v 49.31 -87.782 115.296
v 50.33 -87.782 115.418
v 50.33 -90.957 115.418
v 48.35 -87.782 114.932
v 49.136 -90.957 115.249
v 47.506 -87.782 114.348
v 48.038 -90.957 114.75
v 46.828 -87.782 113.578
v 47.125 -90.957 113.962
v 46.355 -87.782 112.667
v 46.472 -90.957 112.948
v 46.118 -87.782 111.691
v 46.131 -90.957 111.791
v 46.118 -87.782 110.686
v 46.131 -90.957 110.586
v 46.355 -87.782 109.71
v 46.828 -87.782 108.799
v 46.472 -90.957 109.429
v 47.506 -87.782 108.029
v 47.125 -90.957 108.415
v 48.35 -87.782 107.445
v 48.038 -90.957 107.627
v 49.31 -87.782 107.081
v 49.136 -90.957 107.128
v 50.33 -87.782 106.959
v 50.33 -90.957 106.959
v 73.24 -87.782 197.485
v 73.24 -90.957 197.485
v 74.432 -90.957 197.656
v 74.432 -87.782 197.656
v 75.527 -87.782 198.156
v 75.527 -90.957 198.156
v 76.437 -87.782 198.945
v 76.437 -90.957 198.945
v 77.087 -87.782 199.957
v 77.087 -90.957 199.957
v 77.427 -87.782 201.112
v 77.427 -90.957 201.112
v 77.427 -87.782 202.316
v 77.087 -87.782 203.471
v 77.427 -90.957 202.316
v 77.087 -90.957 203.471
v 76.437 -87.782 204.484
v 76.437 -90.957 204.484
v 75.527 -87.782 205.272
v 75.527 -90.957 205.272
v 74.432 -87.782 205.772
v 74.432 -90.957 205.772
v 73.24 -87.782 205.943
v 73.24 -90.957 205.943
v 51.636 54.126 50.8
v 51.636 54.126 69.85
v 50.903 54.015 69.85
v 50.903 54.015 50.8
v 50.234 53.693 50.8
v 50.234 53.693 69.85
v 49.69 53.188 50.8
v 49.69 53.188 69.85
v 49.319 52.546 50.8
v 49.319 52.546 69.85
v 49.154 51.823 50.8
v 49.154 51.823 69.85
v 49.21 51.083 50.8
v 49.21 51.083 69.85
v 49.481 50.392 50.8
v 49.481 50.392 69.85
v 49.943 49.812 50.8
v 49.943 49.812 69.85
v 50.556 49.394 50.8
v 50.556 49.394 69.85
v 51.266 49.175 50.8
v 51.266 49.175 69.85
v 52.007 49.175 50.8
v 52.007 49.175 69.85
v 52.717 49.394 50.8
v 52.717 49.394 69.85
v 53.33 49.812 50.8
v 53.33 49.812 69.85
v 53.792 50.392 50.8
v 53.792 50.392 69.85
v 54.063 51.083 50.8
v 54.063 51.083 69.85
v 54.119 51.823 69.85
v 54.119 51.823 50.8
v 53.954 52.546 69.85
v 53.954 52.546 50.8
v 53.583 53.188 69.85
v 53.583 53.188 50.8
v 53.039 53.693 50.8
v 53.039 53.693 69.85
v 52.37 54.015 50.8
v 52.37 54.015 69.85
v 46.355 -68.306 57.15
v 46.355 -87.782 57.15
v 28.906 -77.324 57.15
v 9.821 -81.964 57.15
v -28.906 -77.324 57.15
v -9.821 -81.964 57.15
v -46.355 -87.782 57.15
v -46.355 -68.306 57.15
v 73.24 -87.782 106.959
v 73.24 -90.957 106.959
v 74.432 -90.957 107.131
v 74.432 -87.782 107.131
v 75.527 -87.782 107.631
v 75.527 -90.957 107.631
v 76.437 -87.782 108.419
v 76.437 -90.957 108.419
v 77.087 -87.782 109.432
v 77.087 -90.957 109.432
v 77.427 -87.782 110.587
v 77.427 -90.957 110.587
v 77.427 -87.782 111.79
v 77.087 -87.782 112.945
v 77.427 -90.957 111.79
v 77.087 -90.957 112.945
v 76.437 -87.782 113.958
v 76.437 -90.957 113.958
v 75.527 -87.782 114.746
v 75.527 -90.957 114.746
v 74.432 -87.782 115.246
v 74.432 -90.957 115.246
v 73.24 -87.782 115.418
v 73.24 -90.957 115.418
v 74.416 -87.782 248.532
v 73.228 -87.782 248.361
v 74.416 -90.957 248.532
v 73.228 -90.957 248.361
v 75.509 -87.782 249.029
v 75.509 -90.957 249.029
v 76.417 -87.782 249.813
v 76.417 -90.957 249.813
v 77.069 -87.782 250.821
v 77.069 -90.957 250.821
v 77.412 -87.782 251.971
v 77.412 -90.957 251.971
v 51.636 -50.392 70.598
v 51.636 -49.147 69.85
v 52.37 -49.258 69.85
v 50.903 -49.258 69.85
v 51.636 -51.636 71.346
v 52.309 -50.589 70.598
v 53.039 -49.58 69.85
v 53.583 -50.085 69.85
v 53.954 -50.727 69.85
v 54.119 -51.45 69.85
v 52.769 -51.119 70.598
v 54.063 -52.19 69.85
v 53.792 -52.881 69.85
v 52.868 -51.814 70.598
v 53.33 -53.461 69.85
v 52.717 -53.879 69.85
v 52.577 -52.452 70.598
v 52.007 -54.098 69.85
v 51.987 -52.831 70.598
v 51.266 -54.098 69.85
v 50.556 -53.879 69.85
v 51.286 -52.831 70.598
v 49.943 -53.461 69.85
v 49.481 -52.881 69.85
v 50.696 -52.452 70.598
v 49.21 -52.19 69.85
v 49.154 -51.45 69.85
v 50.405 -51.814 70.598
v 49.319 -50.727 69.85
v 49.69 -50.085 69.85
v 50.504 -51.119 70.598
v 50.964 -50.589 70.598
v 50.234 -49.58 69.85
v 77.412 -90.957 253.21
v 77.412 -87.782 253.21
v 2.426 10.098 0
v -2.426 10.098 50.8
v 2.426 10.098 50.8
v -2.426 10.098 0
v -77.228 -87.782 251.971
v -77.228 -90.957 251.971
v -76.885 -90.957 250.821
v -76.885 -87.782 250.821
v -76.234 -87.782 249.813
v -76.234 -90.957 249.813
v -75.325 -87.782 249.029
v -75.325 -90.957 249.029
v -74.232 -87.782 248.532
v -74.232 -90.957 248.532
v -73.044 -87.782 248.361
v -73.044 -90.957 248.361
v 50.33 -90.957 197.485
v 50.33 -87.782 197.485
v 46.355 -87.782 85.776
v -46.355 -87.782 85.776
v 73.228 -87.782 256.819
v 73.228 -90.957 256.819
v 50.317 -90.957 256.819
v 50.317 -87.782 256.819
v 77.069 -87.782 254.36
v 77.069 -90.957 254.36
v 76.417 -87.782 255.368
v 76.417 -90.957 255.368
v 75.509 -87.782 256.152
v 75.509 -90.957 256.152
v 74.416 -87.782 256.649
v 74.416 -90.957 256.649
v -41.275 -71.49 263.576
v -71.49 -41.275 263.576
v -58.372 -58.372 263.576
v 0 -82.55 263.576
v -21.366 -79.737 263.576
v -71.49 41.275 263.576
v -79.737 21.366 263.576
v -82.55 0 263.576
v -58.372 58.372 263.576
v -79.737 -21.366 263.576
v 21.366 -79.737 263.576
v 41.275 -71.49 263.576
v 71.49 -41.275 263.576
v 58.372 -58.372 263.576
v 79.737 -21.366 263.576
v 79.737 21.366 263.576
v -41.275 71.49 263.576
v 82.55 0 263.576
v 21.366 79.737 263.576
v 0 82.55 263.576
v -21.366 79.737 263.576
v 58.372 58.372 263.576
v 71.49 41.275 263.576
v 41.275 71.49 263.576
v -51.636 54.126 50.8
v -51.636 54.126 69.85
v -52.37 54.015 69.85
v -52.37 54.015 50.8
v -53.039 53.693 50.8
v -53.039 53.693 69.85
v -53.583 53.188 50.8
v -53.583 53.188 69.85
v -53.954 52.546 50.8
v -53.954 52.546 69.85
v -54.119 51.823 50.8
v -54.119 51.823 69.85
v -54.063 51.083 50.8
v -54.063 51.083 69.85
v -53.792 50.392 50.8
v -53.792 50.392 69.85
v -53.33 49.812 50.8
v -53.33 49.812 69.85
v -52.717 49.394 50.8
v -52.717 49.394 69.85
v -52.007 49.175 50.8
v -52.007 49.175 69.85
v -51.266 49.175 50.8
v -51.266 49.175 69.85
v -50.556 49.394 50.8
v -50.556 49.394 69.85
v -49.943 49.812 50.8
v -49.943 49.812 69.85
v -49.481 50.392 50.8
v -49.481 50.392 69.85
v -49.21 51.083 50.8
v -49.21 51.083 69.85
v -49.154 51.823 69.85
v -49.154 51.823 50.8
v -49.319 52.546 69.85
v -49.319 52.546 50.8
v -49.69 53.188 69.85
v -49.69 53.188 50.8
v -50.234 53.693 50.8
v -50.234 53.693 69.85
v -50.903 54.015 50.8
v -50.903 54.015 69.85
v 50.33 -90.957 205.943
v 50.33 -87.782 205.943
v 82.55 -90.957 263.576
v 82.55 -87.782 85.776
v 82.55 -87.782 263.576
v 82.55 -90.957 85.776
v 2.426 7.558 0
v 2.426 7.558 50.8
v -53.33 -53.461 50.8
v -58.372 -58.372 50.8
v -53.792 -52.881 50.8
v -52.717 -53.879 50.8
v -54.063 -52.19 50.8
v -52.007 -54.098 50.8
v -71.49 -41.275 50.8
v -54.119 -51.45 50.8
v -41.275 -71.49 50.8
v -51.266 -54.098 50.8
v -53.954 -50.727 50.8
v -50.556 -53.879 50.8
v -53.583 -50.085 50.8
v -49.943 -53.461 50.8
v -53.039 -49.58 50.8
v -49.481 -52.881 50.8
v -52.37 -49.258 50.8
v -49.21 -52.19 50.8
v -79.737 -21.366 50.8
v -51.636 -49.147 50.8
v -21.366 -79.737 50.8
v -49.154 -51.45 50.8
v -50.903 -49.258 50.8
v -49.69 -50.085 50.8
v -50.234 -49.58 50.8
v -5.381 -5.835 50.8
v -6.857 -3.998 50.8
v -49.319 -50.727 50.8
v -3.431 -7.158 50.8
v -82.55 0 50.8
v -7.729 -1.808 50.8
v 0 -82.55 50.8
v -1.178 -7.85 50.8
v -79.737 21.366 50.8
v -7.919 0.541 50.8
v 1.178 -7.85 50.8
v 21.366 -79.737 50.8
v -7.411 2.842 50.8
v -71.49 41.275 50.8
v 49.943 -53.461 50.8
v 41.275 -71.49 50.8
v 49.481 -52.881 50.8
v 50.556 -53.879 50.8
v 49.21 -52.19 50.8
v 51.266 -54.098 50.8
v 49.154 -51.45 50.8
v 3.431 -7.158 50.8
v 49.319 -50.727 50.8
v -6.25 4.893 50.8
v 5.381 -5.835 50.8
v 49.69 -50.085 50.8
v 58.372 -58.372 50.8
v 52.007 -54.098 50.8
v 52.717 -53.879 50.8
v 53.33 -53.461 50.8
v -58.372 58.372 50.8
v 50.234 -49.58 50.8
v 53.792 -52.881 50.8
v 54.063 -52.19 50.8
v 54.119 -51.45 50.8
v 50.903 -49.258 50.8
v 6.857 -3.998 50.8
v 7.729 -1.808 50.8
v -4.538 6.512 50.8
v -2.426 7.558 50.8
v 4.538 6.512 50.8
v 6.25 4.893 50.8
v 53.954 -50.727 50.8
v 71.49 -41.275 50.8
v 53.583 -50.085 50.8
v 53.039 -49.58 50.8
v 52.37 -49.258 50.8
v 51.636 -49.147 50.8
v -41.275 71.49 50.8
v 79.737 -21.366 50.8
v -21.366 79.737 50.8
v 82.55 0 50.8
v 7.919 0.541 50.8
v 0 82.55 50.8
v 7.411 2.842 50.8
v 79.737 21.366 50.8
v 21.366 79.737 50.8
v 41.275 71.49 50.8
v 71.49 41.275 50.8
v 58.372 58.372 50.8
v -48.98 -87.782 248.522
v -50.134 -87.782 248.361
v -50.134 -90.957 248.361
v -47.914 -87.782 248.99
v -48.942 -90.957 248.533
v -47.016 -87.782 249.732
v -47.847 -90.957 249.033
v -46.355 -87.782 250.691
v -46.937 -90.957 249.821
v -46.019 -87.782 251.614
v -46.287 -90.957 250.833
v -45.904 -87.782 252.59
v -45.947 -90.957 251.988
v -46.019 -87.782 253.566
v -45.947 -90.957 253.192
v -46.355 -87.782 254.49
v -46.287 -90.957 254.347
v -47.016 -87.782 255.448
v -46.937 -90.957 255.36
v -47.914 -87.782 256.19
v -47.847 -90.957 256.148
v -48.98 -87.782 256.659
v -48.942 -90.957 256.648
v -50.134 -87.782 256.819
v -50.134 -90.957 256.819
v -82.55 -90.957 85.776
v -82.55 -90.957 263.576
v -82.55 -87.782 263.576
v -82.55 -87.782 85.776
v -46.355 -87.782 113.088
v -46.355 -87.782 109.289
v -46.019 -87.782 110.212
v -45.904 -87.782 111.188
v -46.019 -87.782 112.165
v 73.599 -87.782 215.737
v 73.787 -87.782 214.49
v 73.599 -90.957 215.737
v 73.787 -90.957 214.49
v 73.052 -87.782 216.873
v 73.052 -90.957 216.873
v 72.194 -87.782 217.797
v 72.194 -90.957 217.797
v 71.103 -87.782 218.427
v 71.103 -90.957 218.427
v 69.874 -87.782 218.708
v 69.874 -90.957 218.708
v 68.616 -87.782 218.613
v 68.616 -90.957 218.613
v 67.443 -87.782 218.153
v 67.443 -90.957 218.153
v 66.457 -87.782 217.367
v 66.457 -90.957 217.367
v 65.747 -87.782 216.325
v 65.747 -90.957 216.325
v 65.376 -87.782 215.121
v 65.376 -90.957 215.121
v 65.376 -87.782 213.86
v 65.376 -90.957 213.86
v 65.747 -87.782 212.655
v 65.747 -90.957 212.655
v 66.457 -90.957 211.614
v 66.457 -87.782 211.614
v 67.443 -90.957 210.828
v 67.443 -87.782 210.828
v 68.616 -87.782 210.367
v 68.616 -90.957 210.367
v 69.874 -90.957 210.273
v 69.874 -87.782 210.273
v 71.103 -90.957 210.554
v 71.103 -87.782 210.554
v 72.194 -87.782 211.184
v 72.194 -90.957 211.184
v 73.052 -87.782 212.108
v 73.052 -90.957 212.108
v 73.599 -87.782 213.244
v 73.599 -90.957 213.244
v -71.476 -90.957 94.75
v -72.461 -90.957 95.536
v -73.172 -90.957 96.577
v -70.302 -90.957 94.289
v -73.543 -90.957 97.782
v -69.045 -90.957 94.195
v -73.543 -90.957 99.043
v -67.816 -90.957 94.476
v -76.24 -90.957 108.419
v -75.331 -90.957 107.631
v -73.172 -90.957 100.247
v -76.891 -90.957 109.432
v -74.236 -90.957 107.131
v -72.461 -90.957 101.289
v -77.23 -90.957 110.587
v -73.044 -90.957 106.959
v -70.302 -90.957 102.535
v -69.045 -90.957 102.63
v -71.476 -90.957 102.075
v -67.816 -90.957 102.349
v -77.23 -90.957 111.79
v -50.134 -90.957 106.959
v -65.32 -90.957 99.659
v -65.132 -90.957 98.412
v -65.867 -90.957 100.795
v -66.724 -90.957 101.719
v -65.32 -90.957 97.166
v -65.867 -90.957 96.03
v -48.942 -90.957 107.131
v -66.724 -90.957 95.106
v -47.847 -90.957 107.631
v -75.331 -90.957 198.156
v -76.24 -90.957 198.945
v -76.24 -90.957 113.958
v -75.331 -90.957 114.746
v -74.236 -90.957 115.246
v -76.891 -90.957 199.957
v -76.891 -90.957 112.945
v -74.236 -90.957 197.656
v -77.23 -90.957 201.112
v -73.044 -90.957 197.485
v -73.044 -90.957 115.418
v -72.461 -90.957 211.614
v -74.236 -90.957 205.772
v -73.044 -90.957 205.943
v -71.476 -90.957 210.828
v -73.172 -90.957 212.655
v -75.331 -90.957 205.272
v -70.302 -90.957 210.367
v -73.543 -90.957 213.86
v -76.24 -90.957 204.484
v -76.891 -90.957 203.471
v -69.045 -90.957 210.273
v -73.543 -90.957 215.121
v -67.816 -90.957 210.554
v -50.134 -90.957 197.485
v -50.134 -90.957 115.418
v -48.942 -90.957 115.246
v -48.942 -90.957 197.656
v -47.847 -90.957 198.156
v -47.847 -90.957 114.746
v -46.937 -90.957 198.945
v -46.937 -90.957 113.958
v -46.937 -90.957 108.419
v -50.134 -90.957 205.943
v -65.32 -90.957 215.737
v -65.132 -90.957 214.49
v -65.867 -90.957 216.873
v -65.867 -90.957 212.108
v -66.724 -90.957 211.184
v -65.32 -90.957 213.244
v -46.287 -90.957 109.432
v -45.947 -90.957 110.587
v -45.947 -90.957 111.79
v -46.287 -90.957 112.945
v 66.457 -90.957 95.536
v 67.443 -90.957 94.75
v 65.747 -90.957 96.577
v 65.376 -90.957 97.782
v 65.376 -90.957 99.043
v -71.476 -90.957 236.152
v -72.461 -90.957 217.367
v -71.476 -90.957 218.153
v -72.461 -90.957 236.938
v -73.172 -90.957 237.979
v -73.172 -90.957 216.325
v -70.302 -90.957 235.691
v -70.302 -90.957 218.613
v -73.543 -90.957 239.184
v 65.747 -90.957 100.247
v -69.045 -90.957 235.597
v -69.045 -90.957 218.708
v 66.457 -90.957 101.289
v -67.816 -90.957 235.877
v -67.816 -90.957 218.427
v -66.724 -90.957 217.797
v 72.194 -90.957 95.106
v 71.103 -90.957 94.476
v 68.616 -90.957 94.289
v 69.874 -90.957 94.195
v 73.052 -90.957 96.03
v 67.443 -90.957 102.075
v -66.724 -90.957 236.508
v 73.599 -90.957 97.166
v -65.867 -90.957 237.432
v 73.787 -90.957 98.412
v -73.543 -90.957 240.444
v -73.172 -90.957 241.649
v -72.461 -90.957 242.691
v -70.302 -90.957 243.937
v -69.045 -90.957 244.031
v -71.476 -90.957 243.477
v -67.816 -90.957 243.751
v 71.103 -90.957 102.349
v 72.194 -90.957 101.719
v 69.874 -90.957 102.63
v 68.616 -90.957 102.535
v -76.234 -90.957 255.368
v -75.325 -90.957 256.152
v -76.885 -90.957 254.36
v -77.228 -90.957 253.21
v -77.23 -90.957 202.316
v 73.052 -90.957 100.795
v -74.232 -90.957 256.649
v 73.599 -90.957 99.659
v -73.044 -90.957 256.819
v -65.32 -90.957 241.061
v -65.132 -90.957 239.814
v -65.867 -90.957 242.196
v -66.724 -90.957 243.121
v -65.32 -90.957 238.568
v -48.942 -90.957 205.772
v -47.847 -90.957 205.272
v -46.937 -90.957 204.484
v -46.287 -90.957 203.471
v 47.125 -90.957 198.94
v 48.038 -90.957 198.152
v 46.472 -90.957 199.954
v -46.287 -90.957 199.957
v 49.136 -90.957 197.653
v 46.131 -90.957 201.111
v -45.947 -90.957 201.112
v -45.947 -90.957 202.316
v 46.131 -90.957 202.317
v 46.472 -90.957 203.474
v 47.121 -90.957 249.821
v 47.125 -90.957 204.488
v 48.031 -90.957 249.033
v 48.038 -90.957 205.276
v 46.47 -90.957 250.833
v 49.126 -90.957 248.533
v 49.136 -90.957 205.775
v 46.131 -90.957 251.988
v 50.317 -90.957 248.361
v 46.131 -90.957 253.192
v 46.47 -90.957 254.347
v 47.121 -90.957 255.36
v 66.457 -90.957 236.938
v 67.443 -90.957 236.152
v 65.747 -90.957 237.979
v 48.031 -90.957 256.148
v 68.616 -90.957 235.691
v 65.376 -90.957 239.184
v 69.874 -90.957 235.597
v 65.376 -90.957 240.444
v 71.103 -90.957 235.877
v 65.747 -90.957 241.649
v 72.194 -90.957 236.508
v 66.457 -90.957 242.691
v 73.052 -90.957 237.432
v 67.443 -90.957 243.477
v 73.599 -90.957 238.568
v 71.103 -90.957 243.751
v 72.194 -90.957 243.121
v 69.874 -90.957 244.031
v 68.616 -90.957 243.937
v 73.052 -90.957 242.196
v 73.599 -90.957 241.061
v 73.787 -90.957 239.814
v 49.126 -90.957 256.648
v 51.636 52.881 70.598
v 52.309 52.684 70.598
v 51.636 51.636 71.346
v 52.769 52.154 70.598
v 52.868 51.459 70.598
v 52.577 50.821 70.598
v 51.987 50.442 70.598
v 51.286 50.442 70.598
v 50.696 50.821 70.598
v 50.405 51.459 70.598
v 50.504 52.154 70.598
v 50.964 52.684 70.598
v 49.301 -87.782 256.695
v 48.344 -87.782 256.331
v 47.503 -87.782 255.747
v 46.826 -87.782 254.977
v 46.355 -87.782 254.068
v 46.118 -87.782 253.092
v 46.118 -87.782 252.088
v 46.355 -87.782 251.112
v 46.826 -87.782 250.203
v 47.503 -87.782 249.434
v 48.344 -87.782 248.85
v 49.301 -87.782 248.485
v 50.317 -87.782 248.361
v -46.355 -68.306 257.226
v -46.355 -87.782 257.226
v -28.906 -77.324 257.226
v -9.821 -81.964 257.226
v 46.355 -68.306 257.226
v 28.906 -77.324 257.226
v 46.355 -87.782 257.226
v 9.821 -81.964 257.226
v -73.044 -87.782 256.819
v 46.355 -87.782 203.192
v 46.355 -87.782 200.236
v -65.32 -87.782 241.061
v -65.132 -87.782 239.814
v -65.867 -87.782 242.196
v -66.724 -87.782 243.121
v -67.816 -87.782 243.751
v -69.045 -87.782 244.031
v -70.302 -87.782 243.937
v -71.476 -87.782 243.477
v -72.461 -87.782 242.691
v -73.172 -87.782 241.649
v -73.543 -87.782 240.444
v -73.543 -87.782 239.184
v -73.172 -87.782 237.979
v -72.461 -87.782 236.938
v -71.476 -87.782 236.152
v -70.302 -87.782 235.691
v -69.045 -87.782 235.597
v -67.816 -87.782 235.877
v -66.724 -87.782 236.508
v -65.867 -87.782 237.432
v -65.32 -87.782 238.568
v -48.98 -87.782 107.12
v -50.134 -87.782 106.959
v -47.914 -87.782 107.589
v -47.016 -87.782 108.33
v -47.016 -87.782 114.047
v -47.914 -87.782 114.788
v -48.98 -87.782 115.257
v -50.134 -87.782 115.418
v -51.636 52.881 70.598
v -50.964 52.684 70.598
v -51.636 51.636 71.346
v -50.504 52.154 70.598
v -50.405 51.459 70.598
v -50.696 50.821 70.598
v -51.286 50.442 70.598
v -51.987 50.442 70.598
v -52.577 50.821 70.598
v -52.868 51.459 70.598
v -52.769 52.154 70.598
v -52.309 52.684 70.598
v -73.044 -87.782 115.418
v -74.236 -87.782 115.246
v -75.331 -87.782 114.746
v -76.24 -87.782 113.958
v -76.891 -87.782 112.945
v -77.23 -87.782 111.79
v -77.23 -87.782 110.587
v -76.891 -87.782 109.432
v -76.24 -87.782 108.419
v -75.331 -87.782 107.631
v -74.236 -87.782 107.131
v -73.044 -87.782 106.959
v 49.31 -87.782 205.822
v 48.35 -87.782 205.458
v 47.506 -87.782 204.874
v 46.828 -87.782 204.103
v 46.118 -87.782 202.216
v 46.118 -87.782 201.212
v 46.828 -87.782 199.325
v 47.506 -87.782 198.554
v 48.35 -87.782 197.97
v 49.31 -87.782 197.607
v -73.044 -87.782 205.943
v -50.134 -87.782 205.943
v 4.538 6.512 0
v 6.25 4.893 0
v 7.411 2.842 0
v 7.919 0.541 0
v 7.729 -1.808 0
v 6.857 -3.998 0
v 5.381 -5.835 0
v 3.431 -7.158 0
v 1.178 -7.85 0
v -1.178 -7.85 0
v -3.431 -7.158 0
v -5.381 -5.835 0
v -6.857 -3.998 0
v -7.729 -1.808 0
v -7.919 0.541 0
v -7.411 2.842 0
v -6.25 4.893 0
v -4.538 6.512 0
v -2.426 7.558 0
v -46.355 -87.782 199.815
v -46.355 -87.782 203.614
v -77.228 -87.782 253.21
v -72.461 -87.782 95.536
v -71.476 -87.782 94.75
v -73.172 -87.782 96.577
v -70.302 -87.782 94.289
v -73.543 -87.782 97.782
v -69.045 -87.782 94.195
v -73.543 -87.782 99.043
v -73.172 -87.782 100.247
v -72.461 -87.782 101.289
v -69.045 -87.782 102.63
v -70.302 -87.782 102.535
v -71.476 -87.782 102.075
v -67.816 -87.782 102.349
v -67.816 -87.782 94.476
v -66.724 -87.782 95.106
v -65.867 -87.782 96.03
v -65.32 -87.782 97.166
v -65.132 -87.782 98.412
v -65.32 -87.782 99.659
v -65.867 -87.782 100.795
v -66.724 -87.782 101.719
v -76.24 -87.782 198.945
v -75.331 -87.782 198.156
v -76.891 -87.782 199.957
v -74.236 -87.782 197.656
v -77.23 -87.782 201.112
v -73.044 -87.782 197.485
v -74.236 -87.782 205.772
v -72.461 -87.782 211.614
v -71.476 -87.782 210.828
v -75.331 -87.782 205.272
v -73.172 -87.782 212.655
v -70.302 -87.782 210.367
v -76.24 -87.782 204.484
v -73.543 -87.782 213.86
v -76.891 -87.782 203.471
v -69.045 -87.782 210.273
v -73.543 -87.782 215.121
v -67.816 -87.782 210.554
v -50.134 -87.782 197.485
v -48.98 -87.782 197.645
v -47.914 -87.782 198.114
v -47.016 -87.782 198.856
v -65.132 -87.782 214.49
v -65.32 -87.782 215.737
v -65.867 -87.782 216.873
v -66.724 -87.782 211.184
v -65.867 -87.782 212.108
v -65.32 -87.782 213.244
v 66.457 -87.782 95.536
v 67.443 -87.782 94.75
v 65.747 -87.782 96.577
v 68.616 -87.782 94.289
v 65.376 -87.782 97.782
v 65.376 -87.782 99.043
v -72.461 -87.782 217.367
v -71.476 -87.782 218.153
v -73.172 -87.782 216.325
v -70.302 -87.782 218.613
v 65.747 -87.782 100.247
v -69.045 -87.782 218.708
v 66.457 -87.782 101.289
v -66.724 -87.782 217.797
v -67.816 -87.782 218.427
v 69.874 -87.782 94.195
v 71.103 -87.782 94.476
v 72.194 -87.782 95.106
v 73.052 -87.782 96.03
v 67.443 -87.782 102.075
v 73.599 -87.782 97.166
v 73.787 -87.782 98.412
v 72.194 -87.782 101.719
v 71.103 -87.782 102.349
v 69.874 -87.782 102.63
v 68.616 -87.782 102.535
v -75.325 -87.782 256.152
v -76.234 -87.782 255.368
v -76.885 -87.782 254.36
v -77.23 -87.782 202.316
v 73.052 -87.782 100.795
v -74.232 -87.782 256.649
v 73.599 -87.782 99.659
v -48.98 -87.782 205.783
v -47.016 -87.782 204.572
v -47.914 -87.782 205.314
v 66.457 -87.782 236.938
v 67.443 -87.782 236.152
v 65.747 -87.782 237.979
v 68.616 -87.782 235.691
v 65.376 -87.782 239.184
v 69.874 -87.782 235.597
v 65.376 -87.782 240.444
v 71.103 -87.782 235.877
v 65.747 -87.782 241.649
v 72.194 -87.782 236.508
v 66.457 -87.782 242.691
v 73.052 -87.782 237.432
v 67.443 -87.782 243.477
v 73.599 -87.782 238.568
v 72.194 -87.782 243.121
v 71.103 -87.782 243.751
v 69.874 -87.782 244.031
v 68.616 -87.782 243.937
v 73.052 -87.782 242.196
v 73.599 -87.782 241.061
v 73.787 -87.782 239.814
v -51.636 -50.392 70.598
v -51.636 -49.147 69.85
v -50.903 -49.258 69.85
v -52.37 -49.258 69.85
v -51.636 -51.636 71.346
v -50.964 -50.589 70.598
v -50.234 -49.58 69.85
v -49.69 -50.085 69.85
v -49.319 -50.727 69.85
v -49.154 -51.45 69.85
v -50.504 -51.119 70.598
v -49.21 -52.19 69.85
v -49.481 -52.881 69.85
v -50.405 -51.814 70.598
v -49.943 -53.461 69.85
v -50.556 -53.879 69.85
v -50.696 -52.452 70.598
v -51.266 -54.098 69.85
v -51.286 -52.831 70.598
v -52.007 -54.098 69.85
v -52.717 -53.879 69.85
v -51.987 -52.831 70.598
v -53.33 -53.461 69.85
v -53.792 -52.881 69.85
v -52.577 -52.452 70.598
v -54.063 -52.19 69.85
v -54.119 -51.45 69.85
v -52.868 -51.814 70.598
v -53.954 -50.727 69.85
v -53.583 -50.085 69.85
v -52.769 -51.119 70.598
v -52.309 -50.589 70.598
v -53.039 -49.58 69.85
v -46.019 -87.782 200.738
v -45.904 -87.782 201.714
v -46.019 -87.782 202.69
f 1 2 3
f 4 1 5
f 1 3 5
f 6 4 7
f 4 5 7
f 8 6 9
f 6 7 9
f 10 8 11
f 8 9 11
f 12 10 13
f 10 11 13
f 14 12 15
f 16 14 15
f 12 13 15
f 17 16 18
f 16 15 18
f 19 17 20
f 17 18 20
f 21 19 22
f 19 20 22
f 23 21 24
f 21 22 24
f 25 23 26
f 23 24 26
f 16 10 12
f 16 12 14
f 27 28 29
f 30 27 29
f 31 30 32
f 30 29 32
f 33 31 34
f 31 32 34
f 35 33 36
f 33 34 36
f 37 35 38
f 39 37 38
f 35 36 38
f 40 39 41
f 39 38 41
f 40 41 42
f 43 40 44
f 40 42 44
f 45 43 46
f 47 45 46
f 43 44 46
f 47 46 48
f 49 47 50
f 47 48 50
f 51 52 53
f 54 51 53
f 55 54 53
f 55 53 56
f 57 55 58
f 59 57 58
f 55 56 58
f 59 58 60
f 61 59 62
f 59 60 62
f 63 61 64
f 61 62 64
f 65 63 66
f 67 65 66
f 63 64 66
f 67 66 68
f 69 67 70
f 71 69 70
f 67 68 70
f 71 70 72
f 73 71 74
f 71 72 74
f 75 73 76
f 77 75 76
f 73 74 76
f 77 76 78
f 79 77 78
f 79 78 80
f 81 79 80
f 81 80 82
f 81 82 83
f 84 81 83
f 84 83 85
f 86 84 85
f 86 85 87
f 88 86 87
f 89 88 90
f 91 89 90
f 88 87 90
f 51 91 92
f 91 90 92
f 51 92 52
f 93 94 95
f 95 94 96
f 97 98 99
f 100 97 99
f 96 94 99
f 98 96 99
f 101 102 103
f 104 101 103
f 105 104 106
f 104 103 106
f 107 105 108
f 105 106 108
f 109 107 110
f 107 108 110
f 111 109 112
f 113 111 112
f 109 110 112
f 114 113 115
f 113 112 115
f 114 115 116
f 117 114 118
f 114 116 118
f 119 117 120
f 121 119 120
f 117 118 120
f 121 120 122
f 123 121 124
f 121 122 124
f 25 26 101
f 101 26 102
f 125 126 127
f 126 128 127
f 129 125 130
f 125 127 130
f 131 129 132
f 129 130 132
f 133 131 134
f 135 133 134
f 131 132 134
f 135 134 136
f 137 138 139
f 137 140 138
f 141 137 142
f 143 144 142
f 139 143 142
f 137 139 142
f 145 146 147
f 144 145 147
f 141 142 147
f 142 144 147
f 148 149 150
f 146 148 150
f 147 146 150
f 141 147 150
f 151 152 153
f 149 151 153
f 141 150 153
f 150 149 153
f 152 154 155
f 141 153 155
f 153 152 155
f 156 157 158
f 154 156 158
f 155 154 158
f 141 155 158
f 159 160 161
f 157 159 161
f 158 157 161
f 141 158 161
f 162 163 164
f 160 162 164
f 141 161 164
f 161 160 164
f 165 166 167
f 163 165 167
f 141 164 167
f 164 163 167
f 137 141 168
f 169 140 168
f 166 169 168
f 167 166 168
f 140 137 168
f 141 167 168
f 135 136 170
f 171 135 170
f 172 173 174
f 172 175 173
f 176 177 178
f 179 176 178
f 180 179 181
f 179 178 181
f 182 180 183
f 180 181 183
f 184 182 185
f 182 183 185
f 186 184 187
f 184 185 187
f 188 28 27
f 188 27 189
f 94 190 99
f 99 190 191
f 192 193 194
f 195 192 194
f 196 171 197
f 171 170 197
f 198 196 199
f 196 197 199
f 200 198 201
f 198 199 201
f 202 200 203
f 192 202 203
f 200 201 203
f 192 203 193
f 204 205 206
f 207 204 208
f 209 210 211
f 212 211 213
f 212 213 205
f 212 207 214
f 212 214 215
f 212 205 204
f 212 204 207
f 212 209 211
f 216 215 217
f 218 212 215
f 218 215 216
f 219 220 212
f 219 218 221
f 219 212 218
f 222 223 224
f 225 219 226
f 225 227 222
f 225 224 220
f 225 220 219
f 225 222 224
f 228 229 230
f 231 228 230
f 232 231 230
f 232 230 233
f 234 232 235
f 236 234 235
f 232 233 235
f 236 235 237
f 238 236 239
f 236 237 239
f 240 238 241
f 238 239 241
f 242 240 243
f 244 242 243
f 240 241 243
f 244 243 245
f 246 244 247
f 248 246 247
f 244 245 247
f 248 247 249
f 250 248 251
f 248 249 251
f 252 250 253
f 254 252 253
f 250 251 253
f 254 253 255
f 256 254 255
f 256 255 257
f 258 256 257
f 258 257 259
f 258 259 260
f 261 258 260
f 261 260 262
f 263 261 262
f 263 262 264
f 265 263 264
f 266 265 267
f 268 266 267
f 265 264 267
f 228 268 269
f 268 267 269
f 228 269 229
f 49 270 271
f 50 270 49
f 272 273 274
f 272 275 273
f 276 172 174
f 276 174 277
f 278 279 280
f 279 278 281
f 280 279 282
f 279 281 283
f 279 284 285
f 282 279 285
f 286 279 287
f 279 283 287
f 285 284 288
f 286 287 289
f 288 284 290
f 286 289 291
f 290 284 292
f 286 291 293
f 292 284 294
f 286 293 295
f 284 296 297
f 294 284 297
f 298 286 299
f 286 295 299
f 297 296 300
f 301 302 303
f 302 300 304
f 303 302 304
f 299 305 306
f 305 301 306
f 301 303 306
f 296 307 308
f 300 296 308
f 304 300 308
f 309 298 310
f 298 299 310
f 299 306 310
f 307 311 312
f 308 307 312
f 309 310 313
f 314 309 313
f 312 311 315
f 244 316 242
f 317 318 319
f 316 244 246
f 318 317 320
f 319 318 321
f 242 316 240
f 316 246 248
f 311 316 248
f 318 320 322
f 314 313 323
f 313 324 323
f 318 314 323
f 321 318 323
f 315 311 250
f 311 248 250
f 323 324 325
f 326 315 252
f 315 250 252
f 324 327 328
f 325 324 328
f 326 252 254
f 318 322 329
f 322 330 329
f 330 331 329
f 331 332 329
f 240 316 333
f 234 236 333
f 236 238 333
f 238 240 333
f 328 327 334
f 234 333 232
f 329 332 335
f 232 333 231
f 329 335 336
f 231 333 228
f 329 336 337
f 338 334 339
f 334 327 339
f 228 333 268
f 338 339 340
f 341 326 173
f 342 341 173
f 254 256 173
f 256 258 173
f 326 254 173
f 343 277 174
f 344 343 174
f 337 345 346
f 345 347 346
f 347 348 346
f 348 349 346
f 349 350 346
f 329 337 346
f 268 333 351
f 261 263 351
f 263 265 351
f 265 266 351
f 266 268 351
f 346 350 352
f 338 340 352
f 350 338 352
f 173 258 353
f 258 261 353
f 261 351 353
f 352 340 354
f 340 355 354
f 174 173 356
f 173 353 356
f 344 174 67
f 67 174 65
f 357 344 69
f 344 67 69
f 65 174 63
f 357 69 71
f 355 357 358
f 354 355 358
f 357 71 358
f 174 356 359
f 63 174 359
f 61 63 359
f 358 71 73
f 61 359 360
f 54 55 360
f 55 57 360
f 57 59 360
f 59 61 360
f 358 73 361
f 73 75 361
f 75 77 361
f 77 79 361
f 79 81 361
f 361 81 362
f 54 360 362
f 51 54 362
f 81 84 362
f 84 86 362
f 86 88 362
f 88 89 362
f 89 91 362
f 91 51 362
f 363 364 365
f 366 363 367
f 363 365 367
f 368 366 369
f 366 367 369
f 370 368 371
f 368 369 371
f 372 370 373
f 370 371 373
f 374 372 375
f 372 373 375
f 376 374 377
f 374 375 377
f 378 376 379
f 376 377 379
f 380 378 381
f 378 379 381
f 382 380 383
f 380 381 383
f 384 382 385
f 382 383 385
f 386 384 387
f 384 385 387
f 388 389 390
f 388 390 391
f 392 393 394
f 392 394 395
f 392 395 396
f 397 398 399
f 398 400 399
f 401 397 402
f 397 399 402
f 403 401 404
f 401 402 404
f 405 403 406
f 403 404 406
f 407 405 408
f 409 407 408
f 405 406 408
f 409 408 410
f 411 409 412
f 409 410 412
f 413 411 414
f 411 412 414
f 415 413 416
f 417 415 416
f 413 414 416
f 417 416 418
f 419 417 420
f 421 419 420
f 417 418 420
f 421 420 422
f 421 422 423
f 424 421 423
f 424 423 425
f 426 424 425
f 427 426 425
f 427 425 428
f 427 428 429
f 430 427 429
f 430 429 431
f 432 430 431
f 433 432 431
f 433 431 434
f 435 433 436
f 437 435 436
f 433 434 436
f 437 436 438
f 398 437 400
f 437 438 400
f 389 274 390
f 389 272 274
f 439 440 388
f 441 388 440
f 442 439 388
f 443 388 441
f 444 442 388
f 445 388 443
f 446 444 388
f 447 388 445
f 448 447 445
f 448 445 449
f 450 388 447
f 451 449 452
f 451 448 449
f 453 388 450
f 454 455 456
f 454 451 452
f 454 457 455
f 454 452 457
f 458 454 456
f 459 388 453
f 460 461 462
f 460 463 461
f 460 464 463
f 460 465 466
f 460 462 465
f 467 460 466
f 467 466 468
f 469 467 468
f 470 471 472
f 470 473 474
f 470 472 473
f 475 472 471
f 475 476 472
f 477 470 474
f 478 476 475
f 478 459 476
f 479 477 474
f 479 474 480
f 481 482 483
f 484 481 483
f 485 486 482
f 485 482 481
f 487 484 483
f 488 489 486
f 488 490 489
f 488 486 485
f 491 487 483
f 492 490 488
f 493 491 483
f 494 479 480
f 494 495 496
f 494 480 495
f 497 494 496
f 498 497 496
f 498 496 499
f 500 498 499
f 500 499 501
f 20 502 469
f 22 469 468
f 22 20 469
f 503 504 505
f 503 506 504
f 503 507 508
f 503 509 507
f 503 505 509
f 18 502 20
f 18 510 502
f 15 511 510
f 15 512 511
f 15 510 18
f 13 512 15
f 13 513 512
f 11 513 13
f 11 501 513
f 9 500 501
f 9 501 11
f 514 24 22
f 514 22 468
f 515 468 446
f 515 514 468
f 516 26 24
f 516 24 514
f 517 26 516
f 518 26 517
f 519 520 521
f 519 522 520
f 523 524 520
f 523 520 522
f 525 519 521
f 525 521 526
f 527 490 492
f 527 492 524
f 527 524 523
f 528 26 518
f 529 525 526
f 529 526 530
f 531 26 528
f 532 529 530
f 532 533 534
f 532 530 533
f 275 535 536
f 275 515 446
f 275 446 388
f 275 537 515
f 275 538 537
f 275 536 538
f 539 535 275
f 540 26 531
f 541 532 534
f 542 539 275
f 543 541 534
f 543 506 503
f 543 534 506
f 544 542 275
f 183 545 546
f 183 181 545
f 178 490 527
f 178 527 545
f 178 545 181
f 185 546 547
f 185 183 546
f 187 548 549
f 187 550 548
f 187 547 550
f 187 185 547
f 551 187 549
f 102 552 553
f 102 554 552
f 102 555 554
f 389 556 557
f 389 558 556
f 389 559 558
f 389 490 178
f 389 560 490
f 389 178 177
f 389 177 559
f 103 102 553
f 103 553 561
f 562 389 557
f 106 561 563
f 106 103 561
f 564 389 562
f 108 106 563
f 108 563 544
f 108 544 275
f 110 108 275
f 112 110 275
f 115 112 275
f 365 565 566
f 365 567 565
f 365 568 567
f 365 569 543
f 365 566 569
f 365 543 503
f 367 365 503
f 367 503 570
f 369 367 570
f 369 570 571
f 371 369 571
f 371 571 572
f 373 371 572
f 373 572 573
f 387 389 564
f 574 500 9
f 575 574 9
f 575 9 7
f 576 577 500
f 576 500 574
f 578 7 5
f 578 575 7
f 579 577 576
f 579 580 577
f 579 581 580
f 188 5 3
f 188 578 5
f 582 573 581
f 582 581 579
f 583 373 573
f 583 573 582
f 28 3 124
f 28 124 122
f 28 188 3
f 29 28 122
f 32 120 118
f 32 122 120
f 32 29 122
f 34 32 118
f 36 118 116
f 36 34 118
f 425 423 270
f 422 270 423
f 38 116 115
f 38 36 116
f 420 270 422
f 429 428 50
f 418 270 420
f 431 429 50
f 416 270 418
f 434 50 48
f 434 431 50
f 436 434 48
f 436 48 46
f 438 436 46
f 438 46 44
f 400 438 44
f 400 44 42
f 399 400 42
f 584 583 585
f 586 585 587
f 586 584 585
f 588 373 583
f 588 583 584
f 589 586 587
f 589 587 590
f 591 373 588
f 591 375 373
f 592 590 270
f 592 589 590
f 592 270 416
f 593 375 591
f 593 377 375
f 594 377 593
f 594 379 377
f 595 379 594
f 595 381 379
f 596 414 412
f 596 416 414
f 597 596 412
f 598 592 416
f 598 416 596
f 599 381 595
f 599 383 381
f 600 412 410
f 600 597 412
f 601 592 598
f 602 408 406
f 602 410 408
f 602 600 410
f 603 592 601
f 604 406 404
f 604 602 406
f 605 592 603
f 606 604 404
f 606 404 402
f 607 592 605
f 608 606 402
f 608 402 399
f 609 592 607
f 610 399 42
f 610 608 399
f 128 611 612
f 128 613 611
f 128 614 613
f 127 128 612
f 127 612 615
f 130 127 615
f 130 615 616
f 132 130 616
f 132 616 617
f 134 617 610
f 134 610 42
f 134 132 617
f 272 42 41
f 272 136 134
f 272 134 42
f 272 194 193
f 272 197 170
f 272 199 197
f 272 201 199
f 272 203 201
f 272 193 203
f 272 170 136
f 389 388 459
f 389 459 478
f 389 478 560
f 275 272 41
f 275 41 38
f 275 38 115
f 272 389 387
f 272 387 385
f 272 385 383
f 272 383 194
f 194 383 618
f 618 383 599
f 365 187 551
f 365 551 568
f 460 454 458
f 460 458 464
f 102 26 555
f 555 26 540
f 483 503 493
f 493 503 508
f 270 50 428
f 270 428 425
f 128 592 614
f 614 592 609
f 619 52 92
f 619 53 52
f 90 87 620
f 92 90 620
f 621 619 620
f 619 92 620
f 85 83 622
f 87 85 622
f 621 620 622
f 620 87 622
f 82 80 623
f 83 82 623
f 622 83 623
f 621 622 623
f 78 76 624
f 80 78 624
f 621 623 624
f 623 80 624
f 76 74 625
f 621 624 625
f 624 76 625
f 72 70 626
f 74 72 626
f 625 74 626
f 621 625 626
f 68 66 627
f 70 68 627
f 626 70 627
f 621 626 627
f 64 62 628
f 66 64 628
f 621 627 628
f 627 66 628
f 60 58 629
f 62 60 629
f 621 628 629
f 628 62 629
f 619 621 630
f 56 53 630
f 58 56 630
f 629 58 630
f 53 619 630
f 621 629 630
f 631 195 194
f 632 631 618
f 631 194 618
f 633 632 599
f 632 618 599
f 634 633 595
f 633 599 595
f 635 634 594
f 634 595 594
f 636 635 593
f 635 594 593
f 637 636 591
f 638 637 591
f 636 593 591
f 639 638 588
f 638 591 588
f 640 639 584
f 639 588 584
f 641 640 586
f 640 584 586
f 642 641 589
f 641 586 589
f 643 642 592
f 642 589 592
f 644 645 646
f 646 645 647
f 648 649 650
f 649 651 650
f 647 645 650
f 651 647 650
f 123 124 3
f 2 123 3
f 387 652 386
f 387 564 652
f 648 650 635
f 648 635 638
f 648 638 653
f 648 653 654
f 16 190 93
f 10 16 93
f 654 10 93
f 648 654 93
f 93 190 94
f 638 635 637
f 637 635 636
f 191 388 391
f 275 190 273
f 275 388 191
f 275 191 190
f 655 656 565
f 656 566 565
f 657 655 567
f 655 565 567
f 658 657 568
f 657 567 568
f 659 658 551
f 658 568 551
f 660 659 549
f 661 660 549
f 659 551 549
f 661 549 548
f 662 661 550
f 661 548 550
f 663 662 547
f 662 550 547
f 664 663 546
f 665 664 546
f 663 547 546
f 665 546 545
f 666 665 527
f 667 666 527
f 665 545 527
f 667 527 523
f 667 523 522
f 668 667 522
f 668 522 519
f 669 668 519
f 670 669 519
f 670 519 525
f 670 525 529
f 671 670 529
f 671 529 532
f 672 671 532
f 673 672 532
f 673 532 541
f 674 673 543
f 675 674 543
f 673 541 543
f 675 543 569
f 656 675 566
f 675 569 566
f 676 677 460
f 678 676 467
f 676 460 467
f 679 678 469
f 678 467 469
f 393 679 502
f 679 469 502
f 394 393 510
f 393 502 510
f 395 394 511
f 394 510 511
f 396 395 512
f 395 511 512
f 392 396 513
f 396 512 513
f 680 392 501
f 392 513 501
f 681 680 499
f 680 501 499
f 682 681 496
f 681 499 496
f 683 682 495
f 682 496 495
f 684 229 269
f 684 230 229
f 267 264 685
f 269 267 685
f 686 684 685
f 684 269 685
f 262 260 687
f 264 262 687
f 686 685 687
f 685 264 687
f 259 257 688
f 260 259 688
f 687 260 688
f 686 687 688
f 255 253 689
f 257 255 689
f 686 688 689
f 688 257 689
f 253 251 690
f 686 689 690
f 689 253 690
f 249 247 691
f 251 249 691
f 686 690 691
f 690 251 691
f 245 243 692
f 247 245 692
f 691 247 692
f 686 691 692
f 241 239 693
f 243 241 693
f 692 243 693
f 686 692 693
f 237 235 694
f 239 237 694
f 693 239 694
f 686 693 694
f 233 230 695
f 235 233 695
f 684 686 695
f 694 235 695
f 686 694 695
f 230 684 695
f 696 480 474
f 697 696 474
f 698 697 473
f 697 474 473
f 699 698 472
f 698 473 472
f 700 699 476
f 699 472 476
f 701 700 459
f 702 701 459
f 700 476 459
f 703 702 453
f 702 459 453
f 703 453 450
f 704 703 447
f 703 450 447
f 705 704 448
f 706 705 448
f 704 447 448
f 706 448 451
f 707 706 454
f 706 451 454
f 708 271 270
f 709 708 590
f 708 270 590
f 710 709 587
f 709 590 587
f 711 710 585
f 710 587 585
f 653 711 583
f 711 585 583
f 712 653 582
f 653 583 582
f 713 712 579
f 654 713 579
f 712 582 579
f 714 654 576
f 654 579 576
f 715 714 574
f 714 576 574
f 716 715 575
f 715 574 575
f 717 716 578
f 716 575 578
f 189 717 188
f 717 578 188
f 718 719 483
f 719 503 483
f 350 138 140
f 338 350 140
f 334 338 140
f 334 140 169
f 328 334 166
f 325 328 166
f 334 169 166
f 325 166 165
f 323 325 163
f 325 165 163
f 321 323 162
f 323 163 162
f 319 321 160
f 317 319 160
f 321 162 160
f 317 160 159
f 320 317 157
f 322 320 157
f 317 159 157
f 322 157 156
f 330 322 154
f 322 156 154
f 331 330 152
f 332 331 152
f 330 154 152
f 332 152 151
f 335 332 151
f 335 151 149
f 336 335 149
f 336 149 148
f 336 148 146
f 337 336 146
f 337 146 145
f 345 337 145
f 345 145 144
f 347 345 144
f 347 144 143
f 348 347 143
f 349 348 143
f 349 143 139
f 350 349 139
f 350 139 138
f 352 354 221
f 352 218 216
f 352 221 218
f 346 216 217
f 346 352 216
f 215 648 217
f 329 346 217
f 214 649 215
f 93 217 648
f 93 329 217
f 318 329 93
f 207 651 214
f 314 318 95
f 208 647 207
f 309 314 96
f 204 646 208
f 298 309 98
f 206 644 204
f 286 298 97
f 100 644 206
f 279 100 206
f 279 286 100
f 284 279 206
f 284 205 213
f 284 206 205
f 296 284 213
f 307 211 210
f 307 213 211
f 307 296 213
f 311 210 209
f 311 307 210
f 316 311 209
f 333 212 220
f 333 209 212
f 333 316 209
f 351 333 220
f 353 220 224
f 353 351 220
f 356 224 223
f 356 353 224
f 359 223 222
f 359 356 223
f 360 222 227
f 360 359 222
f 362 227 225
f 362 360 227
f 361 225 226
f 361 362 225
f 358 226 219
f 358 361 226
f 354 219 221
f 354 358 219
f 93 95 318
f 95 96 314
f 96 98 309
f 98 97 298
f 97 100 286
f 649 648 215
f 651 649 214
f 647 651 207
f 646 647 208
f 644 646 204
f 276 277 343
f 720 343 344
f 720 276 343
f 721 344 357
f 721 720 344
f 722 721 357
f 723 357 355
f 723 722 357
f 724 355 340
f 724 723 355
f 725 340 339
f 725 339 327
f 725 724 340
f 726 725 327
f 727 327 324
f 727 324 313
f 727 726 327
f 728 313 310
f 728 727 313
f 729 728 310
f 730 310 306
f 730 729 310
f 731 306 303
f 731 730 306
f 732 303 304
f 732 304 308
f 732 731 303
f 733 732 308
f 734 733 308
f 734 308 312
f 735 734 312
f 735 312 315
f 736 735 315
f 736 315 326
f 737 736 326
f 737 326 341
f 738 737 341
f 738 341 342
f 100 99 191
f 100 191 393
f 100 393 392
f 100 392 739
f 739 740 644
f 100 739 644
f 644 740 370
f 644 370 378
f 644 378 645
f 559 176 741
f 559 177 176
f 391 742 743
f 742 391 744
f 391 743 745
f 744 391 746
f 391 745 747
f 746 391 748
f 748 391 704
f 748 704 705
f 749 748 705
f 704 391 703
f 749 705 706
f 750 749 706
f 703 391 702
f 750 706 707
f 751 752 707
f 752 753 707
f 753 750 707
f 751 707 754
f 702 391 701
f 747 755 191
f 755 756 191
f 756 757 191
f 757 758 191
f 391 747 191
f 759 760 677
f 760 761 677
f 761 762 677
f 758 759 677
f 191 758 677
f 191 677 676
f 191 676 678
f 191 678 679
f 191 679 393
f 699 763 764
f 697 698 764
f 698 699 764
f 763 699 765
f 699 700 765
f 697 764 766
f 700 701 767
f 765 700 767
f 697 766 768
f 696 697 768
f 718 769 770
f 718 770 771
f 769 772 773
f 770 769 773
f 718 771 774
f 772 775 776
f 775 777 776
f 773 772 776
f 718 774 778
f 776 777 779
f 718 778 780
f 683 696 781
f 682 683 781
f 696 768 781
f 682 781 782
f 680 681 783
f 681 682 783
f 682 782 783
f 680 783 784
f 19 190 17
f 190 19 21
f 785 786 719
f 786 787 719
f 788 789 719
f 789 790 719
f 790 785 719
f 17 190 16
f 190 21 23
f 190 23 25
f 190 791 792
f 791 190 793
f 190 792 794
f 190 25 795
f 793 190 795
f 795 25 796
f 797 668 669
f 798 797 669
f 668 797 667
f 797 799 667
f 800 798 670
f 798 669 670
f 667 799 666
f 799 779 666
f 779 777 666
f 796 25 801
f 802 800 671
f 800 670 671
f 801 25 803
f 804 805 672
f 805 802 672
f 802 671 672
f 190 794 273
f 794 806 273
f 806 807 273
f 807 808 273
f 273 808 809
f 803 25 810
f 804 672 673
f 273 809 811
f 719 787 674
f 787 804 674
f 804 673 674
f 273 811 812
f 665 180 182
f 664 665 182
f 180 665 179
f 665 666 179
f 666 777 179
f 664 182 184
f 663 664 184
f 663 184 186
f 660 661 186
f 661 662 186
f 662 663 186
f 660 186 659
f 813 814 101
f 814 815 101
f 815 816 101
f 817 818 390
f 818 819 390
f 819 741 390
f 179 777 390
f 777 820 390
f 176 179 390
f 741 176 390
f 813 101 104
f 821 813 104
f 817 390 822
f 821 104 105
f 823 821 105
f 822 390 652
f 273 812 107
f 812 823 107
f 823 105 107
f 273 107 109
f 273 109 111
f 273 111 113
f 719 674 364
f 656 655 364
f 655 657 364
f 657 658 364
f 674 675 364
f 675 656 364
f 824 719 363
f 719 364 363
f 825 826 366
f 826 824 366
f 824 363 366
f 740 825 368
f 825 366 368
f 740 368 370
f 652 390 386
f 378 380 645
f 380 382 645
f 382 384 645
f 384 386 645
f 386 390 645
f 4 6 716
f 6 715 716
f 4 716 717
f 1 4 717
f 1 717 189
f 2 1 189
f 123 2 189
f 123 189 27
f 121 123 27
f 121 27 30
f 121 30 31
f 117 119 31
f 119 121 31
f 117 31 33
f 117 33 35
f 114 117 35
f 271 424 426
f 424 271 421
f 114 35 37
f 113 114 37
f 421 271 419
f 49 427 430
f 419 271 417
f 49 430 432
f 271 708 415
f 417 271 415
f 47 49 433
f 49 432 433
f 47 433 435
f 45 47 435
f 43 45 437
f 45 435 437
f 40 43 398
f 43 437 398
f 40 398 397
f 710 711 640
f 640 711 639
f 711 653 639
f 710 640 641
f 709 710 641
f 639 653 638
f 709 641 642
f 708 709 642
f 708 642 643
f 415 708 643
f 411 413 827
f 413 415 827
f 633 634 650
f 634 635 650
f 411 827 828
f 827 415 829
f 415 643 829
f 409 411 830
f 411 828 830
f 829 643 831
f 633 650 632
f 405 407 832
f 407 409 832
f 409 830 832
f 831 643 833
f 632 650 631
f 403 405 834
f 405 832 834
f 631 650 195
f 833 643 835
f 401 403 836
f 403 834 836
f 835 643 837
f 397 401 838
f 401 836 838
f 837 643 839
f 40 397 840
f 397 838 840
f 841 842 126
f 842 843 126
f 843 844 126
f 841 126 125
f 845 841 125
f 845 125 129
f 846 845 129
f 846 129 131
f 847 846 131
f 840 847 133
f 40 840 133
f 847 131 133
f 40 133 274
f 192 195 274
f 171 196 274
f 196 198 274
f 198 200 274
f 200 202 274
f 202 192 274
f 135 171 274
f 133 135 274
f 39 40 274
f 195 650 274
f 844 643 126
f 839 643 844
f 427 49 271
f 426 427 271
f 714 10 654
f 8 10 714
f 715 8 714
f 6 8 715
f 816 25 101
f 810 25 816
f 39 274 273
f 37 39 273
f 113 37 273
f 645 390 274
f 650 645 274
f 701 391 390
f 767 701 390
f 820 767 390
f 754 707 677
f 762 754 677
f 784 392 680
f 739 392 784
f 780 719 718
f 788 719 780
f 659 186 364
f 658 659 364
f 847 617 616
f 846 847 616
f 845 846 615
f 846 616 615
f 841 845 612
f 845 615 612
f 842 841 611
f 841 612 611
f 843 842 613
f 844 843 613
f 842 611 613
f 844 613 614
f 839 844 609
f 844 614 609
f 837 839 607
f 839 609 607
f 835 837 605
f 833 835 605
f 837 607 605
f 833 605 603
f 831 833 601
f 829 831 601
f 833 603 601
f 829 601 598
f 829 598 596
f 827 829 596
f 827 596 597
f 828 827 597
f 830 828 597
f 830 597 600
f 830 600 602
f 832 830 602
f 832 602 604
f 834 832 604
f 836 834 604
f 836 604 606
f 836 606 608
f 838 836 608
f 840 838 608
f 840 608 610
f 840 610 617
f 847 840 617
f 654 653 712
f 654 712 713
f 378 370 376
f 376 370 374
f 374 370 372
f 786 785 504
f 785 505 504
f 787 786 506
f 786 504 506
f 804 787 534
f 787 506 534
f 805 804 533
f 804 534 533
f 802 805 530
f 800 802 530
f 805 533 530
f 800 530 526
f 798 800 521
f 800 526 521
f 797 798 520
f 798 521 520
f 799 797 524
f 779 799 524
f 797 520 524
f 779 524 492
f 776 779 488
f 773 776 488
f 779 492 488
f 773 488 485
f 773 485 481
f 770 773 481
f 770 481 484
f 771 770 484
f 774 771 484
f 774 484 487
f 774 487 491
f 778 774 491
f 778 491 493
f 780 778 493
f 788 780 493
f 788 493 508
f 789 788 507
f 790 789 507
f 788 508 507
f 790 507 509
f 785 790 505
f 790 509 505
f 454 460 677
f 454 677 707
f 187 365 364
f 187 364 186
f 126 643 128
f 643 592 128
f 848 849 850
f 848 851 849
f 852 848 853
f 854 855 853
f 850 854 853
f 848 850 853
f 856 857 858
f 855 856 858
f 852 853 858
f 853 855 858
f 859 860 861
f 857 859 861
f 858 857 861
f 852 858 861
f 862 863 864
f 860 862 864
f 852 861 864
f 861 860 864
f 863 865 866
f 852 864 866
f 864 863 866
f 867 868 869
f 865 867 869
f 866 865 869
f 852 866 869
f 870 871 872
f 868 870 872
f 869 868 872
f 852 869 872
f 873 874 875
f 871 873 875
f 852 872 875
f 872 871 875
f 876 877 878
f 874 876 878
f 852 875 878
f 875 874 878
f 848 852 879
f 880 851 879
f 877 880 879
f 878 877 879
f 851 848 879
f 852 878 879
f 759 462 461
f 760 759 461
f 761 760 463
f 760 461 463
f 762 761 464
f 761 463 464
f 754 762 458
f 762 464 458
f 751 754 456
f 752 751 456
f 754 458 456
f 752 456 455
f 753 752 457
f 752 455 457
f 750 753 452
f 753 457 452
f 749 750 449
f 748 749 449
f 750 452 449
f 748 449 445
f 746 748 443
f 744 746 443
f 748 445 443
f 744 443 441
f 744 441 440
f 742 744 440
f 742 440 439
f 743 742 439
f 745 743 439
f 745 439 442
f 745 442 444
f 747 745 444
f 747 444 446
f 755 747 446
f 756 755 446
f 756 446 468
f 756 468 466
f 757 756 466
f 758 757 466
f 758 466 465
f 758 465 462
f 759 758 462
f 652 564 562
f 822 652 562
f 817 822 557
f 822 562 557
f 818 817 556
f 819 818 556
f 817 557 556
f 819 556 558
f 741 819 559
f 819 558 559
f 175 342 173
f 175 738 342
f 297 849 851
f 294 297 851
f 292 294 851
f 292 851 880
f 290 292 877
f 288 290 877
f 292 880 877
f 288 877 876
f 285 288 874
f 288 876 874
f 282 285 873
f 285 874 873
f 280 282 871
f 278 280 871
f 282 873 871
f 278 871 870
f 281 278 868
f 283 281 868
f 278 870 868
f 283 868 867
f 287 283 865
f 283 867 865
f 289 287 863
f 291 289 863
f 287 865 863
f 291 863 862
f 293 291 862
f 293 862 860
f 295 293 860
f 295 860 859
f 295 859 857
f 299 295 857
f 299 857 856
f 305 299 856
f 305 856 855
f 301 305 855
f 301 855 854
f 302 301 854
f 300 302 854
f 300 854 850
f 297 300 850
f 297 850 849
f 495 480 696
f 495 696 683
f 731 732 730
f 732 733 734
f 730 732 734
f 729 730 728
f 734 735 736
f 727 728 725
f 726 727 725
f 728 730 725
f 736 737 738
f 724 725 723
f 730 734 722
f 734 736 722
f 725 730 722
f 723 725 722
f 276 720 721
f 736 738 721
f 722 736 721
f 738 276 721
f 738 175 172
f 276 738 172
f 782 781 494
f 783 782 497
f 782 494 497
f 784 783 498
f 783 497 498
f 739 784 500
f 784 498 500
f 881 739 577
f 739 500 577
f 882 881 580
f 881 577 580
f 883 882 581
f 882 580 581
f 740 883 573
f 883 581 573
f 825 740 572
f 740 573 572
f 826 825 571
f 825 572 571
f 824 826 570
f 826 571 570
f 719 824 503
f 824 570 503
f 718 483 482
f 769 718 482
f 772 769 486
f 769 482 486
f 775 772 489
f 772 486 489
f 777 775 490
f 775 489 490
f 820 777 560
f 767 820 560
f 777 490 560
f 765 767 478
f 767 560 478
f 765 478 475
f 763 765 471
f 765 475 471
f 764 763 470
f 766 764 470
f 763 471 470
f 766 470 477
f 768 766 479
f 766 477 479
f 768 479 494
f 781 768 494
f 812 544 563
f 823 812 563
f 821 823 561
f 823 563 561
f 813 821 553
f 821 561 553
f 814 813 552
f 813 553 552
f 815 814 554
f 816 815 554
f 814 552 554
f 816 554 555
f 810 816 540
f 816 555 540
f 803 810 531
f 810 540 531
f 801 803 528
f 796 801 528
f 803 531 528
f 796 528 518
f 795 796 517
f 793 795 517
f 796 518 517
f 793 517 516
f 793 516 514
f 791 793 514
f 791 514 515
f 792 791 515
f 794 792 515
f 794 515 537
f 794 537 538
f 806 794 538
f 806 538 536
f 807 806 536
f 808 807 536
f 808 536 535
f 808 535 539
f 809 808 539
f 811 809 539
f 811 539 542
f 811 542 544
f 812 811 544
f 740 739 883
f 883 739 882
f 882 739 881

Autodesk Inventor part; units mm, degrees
ref_plane "YZ Plane" through (0, 0, 0) normal (1, 0, 0) x (0, 1, 0)
ref_plane "XZ Plane" through (0, 0, 0) normal (0, 1, 0) x (-1, 0, 0)
ref_plane "XY Plane" through (0, 0, 0) normal (0, 0, 1) x (1, 0, 0)
sketch "Sketch1" plane through (0, 0, 0) normal (0, 0, 1) x (1, 0, 0)
  circle A0 centre (0, 0) radius 7.9375
  line L0 (-2.4257, 7.5578) -> (-2.4257, 10.0978)
  line L1 (-2.4257, 10.0978) -> (2.4257, 10.0978)
  line L2 (2.4257, 10.0978) -> (2.4257, 7.5578)
  point P0 (0, 10.0978)
  dimension "d0" = 15.875
  dimension "d1" = 2.54
  dimension "d2" = 4.8514
extrude "Extrusion1" add sketch "Sketch1" along normal blind 50.8
sketch "Sketch2" plane through (0, 0, 50.8) normal (0, 0, 1) x (1, 0, 0)
  circle A0 centre (0, 0) radius 82.55
  dimension "d5" = 165.1
extrude "Extrusion2" add sketch "Sketch2" along normal blind 212.7758
sketch "Sketch3" plane through (0, 0, 50.8) normal (0, 0, -1) x (-1, 0, 0)
  circle A0 centre (0, 0) radius 73.025
  arc A1 (-2.4257, 7.5578) -> (2.4257, 7.5578) centre (0, 0) ccw projected
  line L0 (0, 0) -> (51.6365, 51.6365)
  line L1 (0, 0) -> (73.025, 0) construction
  line L2 (0, 0) -> (51.6365, -51.6365)
  line L3 (0, 0) -> (73.025, 0) construction
  line L4 (0, 0) -> (-51.6365, 51.6365)
  line L5 (0, 0) -> (73.025, 0) construction
  line L6 (0, 0) -> (-51.6365, -51.6365)
  line L7 (0, 0) -> (73.025, 0) construction
  dimension "d8" = 146.05
  dimension "d9" = 45
  dimension "d10" = 45
  dimension "d11" = 135
  dimension "d12" = 135
hole "Hole1" at (51.6365, 51.6365, 50.8) at (-51.6365, 51.6365, 50.8) at (-51.6365, -51.6365, 50.8) at (51.6365, -51.6365, 50.8) direction (0, 0, 1) diameter 4.9784 depth 19.05 tip angle 118 thread size "1/4-20 UNC" class "2B" standard "ANSI Unified Screw Threads"
ref_plane "Work Plane2" through (0, -82.55, 50.8) normal (0, 1, 0) x (-1, 0, 0)
sketch "Sketch4" plane through (0, -82.55, 50.8) normal (0, 1, 0) x (-1, 0, 0)
  line L0 (82.55, 212.7758) -> (-82.55, 212.7758) projected
  line L1 (-82.55, 0) -> (82.55, 0) projected
  line L2 (82.55, 0) -> (82.55, 177.8) projected
  line L3 (-82.55, 0) -> (-82.55, 177.8) projected
  line L4 (-46.355, 6.35) -> (46.355, 6.35)
  line L5 (46.355, 6.35) -> (46.355, 206.4258)
  line L6 (46.355, 206.4258) -> (-46.355, 206.4258)
  line L7 (-46.355, 206.4258) -> (-46.355, 6.35)
  point P0 (0, -50.8)
  point P1 (0, 6.35)
  dimension "d20" = 200.0758
  dimension "d21" = 6.35
  dimension "d22" = 92.71
extrude "Extrusion3" add sketch "Sketch4" along normal blind 25.4 and the other way blind 5.2324
ref_plane "Work Plane7" through (0, -90.9574, 50.8) normal (0, -1, 0) x (1, 0, 0)
sketch "Sketch5" plane through (0, -90.9574, 50.8) normal (0, -1, 0) x (1, 0, 0)
  line L0 (82.55, 212.7758) -> (-82.55, 212.7758) projected
  line L1 (82.55, 212.7758) -> (-82.55, 212.7758)
  line L2 (-82.55, 212.7758) -> (-82.55, 34.9758)
  line L3 (-82.55, 34.9758) -> (82.55, 34.9758)
  line L4 (82.55, 34.9758) -> (82.55, 212.7758)
  point P0 (0, -50.8)
  dimension "d54" = 177.8
  dimension "d55" = 165.1
extrude "Extrusion4" add sketch "Sketch5" against normal blind 3.175
ref_plane "Work Plane9" through (0, -94.1324, 50.8) normal (0, -1, 0) x (1, 0, 0)
sketch "Sketch6" plane through (0, -94.1324, 50.8) normal (0, -1, 0) x (1, 0, 0)
  circle A0 centre (69.5575, 189.0141) radius 4.2291
  line L0 (73.2282, 206.0194) -> (50.3174, 206.0194)
  line L1 (50.3174, 197.5612) -> (73.2282, 197.5612)
  line L2 (77.4117, 201.1711) -> (77.4117, 202.4095)
  arc A1 (73.2282, 197.5612) -> (73.2282, 206.0194) centre (73.2282, 201.7903) ccw
  arc A2 (50.3174, 206.0194) -> (50.3174, 197.5612) centre (50.3174, 201.7903) ccw
  circle A3 centre (69.5575, 163.6903) radius 4.2291
  line L3 (73.2405, 146.685) -> (50.3297, 146.685)
  line L4 (50.3297, 155.1432) -> (73.2405, 155.1432)
  arc A4 (73.2405, 146.685) -> (73.2405, 155.1432) centre (73.2405, 150.9141) ccw
  arc A5 (50.3297, 155.1432) -> (50.3297, 146.685) centre (50.3174, 150.9141) ccw
  arc A6 (73.2405, 56.1594) -> (73.2405, 64.6176) centre (73.2405, 60.3885) ccw
  line L5 (50.3297, 56.1594) -> (73.2405, 56.1594)
  line L6 (73.2405, 64.6176) -> (50.3297, 64.6176)
  arc A7 (50.3297, 64.6176) -> (50.3297, 56.1594) centre (50.3174, 60.3885) ccw
  circle A8 centre (69.5575, 47.6123) radius 4.2291
  circle A9 centre (-69.3613, 189.0141) radius 4.2291
  line L7 (-73.0443, 206.0194) -> (-50.1335, 206.0194)
  line L8 (-50.1335, 197.5612) -> (-73.0443, 197.5612)
  line L9 (-77.2278, 201.1711) -> (-77.2278, 202.4095)
  arc A10 (-73.0443, 206.0194) -> (-73.0443, 197.5612) centre (-73.0443, 201.7903) ccw
  arc A11 (-50.1335, 197.5612) -> (-50.1335, 206.0194) centre (-50.1335, 201.7903) ccw
  arc A12 (-73.0443, 155.1432) -> (-73.0443, 146.685) centre (-73.0443, 150.9141) ccw
  line L10 (-50.1335, 155.1432) -> (-73.0443, 155.1432)
  line L11 (-73.0443, 146.685) -> (-50.1335, 146.685)
  arc A13 (-50.1335, 146.685) -> (-50.1335, 155.1432) centre (-50.1335, 150.9141) ccw
  circle A14 centre (-69.3613, 163.6903) radius 4.2291
  circle A15 centre (-69.3613, 47.6123) radius 4.2291
  line L12 (-50.1335, 56.1594) -> (-73.0443, 56.1594)
  line L13 (-73.0443, 64.6176) -> (-50.1335, 64.6176)
  arc A16 (-73.0443, 64.6176) -> (-73.0443, 56.1594) centre (-73.0443, 60.3885) ccw
  arc A17 (-50.1335, 56.1594) -> (-50.1335, 64.6176) centre (-50.1335, 60.3885) ccw
  line L14 (-82.55, 212.7758) -> (-82.55, 34.9758) projected
  line L15 (82.55, 212.7758) -> (-82.55, 212.7758) projected
  line L16 (82.55, 34.9758) -> (82.55, 212.7758) projected
  line L17 (82.55, 212.7758) -> (82.55, 34.9758) projected
  point P0 (0, -50.8)
  point P1 (-61.5889, 206.0194)
  point P2 (61.7728, 206.0194)
  point P3 (-61.5889, 197.5612)
  point P4 (61.7728, 197.5612)
  point P5 (-61.5889, 155.1432)
  point P6 (61.7851, 155.1432)
  dimension "d31" = 8.4582
  dimension "d38" = 8.4582
  dimension "d39" = 8.4582
  dimension "d40" = 22.9108
  dimension "d41" = 8.4582
  dimension "d51" = 8.5471
  dimension "d56" = 50.8762
  dimension "d57" = 12.7762
  dimension "d58" = 6.7564
  dimension "d59" = 12.7762
  dimension "d60" = 90.5256
  dimension "d62" = 9.3218
extrude "Extrusion5" cut sketch "Sketch6" against normal blind 6.35 contours A0 | A1 L2 L1 A2 L0 | A3 | L3 A5 L4 A4 | L5 A7 L6 A6 | A8 | A9 | L7 A11 L8 A10 L9 | L10 A13 L11 A12 | A14 | A15 | L12 A16 L13 A17
sketch "Sketch7" plane through (0, -87.7824, 50.8) normal (0, -1, 0) x (1, 0, 0)
  point P0 (0, -50.8)
equation "\"d3\" = ShaftL"
equation "\"d5\" = MotoD"
equation "\"d6\" = MotoL"
equation "\"ShaftL\" = 50.8"
equation "\"MotoD\" = 165.1"
equation "\"MotoL\" = 212.7758"
properties part number "Motor4"
